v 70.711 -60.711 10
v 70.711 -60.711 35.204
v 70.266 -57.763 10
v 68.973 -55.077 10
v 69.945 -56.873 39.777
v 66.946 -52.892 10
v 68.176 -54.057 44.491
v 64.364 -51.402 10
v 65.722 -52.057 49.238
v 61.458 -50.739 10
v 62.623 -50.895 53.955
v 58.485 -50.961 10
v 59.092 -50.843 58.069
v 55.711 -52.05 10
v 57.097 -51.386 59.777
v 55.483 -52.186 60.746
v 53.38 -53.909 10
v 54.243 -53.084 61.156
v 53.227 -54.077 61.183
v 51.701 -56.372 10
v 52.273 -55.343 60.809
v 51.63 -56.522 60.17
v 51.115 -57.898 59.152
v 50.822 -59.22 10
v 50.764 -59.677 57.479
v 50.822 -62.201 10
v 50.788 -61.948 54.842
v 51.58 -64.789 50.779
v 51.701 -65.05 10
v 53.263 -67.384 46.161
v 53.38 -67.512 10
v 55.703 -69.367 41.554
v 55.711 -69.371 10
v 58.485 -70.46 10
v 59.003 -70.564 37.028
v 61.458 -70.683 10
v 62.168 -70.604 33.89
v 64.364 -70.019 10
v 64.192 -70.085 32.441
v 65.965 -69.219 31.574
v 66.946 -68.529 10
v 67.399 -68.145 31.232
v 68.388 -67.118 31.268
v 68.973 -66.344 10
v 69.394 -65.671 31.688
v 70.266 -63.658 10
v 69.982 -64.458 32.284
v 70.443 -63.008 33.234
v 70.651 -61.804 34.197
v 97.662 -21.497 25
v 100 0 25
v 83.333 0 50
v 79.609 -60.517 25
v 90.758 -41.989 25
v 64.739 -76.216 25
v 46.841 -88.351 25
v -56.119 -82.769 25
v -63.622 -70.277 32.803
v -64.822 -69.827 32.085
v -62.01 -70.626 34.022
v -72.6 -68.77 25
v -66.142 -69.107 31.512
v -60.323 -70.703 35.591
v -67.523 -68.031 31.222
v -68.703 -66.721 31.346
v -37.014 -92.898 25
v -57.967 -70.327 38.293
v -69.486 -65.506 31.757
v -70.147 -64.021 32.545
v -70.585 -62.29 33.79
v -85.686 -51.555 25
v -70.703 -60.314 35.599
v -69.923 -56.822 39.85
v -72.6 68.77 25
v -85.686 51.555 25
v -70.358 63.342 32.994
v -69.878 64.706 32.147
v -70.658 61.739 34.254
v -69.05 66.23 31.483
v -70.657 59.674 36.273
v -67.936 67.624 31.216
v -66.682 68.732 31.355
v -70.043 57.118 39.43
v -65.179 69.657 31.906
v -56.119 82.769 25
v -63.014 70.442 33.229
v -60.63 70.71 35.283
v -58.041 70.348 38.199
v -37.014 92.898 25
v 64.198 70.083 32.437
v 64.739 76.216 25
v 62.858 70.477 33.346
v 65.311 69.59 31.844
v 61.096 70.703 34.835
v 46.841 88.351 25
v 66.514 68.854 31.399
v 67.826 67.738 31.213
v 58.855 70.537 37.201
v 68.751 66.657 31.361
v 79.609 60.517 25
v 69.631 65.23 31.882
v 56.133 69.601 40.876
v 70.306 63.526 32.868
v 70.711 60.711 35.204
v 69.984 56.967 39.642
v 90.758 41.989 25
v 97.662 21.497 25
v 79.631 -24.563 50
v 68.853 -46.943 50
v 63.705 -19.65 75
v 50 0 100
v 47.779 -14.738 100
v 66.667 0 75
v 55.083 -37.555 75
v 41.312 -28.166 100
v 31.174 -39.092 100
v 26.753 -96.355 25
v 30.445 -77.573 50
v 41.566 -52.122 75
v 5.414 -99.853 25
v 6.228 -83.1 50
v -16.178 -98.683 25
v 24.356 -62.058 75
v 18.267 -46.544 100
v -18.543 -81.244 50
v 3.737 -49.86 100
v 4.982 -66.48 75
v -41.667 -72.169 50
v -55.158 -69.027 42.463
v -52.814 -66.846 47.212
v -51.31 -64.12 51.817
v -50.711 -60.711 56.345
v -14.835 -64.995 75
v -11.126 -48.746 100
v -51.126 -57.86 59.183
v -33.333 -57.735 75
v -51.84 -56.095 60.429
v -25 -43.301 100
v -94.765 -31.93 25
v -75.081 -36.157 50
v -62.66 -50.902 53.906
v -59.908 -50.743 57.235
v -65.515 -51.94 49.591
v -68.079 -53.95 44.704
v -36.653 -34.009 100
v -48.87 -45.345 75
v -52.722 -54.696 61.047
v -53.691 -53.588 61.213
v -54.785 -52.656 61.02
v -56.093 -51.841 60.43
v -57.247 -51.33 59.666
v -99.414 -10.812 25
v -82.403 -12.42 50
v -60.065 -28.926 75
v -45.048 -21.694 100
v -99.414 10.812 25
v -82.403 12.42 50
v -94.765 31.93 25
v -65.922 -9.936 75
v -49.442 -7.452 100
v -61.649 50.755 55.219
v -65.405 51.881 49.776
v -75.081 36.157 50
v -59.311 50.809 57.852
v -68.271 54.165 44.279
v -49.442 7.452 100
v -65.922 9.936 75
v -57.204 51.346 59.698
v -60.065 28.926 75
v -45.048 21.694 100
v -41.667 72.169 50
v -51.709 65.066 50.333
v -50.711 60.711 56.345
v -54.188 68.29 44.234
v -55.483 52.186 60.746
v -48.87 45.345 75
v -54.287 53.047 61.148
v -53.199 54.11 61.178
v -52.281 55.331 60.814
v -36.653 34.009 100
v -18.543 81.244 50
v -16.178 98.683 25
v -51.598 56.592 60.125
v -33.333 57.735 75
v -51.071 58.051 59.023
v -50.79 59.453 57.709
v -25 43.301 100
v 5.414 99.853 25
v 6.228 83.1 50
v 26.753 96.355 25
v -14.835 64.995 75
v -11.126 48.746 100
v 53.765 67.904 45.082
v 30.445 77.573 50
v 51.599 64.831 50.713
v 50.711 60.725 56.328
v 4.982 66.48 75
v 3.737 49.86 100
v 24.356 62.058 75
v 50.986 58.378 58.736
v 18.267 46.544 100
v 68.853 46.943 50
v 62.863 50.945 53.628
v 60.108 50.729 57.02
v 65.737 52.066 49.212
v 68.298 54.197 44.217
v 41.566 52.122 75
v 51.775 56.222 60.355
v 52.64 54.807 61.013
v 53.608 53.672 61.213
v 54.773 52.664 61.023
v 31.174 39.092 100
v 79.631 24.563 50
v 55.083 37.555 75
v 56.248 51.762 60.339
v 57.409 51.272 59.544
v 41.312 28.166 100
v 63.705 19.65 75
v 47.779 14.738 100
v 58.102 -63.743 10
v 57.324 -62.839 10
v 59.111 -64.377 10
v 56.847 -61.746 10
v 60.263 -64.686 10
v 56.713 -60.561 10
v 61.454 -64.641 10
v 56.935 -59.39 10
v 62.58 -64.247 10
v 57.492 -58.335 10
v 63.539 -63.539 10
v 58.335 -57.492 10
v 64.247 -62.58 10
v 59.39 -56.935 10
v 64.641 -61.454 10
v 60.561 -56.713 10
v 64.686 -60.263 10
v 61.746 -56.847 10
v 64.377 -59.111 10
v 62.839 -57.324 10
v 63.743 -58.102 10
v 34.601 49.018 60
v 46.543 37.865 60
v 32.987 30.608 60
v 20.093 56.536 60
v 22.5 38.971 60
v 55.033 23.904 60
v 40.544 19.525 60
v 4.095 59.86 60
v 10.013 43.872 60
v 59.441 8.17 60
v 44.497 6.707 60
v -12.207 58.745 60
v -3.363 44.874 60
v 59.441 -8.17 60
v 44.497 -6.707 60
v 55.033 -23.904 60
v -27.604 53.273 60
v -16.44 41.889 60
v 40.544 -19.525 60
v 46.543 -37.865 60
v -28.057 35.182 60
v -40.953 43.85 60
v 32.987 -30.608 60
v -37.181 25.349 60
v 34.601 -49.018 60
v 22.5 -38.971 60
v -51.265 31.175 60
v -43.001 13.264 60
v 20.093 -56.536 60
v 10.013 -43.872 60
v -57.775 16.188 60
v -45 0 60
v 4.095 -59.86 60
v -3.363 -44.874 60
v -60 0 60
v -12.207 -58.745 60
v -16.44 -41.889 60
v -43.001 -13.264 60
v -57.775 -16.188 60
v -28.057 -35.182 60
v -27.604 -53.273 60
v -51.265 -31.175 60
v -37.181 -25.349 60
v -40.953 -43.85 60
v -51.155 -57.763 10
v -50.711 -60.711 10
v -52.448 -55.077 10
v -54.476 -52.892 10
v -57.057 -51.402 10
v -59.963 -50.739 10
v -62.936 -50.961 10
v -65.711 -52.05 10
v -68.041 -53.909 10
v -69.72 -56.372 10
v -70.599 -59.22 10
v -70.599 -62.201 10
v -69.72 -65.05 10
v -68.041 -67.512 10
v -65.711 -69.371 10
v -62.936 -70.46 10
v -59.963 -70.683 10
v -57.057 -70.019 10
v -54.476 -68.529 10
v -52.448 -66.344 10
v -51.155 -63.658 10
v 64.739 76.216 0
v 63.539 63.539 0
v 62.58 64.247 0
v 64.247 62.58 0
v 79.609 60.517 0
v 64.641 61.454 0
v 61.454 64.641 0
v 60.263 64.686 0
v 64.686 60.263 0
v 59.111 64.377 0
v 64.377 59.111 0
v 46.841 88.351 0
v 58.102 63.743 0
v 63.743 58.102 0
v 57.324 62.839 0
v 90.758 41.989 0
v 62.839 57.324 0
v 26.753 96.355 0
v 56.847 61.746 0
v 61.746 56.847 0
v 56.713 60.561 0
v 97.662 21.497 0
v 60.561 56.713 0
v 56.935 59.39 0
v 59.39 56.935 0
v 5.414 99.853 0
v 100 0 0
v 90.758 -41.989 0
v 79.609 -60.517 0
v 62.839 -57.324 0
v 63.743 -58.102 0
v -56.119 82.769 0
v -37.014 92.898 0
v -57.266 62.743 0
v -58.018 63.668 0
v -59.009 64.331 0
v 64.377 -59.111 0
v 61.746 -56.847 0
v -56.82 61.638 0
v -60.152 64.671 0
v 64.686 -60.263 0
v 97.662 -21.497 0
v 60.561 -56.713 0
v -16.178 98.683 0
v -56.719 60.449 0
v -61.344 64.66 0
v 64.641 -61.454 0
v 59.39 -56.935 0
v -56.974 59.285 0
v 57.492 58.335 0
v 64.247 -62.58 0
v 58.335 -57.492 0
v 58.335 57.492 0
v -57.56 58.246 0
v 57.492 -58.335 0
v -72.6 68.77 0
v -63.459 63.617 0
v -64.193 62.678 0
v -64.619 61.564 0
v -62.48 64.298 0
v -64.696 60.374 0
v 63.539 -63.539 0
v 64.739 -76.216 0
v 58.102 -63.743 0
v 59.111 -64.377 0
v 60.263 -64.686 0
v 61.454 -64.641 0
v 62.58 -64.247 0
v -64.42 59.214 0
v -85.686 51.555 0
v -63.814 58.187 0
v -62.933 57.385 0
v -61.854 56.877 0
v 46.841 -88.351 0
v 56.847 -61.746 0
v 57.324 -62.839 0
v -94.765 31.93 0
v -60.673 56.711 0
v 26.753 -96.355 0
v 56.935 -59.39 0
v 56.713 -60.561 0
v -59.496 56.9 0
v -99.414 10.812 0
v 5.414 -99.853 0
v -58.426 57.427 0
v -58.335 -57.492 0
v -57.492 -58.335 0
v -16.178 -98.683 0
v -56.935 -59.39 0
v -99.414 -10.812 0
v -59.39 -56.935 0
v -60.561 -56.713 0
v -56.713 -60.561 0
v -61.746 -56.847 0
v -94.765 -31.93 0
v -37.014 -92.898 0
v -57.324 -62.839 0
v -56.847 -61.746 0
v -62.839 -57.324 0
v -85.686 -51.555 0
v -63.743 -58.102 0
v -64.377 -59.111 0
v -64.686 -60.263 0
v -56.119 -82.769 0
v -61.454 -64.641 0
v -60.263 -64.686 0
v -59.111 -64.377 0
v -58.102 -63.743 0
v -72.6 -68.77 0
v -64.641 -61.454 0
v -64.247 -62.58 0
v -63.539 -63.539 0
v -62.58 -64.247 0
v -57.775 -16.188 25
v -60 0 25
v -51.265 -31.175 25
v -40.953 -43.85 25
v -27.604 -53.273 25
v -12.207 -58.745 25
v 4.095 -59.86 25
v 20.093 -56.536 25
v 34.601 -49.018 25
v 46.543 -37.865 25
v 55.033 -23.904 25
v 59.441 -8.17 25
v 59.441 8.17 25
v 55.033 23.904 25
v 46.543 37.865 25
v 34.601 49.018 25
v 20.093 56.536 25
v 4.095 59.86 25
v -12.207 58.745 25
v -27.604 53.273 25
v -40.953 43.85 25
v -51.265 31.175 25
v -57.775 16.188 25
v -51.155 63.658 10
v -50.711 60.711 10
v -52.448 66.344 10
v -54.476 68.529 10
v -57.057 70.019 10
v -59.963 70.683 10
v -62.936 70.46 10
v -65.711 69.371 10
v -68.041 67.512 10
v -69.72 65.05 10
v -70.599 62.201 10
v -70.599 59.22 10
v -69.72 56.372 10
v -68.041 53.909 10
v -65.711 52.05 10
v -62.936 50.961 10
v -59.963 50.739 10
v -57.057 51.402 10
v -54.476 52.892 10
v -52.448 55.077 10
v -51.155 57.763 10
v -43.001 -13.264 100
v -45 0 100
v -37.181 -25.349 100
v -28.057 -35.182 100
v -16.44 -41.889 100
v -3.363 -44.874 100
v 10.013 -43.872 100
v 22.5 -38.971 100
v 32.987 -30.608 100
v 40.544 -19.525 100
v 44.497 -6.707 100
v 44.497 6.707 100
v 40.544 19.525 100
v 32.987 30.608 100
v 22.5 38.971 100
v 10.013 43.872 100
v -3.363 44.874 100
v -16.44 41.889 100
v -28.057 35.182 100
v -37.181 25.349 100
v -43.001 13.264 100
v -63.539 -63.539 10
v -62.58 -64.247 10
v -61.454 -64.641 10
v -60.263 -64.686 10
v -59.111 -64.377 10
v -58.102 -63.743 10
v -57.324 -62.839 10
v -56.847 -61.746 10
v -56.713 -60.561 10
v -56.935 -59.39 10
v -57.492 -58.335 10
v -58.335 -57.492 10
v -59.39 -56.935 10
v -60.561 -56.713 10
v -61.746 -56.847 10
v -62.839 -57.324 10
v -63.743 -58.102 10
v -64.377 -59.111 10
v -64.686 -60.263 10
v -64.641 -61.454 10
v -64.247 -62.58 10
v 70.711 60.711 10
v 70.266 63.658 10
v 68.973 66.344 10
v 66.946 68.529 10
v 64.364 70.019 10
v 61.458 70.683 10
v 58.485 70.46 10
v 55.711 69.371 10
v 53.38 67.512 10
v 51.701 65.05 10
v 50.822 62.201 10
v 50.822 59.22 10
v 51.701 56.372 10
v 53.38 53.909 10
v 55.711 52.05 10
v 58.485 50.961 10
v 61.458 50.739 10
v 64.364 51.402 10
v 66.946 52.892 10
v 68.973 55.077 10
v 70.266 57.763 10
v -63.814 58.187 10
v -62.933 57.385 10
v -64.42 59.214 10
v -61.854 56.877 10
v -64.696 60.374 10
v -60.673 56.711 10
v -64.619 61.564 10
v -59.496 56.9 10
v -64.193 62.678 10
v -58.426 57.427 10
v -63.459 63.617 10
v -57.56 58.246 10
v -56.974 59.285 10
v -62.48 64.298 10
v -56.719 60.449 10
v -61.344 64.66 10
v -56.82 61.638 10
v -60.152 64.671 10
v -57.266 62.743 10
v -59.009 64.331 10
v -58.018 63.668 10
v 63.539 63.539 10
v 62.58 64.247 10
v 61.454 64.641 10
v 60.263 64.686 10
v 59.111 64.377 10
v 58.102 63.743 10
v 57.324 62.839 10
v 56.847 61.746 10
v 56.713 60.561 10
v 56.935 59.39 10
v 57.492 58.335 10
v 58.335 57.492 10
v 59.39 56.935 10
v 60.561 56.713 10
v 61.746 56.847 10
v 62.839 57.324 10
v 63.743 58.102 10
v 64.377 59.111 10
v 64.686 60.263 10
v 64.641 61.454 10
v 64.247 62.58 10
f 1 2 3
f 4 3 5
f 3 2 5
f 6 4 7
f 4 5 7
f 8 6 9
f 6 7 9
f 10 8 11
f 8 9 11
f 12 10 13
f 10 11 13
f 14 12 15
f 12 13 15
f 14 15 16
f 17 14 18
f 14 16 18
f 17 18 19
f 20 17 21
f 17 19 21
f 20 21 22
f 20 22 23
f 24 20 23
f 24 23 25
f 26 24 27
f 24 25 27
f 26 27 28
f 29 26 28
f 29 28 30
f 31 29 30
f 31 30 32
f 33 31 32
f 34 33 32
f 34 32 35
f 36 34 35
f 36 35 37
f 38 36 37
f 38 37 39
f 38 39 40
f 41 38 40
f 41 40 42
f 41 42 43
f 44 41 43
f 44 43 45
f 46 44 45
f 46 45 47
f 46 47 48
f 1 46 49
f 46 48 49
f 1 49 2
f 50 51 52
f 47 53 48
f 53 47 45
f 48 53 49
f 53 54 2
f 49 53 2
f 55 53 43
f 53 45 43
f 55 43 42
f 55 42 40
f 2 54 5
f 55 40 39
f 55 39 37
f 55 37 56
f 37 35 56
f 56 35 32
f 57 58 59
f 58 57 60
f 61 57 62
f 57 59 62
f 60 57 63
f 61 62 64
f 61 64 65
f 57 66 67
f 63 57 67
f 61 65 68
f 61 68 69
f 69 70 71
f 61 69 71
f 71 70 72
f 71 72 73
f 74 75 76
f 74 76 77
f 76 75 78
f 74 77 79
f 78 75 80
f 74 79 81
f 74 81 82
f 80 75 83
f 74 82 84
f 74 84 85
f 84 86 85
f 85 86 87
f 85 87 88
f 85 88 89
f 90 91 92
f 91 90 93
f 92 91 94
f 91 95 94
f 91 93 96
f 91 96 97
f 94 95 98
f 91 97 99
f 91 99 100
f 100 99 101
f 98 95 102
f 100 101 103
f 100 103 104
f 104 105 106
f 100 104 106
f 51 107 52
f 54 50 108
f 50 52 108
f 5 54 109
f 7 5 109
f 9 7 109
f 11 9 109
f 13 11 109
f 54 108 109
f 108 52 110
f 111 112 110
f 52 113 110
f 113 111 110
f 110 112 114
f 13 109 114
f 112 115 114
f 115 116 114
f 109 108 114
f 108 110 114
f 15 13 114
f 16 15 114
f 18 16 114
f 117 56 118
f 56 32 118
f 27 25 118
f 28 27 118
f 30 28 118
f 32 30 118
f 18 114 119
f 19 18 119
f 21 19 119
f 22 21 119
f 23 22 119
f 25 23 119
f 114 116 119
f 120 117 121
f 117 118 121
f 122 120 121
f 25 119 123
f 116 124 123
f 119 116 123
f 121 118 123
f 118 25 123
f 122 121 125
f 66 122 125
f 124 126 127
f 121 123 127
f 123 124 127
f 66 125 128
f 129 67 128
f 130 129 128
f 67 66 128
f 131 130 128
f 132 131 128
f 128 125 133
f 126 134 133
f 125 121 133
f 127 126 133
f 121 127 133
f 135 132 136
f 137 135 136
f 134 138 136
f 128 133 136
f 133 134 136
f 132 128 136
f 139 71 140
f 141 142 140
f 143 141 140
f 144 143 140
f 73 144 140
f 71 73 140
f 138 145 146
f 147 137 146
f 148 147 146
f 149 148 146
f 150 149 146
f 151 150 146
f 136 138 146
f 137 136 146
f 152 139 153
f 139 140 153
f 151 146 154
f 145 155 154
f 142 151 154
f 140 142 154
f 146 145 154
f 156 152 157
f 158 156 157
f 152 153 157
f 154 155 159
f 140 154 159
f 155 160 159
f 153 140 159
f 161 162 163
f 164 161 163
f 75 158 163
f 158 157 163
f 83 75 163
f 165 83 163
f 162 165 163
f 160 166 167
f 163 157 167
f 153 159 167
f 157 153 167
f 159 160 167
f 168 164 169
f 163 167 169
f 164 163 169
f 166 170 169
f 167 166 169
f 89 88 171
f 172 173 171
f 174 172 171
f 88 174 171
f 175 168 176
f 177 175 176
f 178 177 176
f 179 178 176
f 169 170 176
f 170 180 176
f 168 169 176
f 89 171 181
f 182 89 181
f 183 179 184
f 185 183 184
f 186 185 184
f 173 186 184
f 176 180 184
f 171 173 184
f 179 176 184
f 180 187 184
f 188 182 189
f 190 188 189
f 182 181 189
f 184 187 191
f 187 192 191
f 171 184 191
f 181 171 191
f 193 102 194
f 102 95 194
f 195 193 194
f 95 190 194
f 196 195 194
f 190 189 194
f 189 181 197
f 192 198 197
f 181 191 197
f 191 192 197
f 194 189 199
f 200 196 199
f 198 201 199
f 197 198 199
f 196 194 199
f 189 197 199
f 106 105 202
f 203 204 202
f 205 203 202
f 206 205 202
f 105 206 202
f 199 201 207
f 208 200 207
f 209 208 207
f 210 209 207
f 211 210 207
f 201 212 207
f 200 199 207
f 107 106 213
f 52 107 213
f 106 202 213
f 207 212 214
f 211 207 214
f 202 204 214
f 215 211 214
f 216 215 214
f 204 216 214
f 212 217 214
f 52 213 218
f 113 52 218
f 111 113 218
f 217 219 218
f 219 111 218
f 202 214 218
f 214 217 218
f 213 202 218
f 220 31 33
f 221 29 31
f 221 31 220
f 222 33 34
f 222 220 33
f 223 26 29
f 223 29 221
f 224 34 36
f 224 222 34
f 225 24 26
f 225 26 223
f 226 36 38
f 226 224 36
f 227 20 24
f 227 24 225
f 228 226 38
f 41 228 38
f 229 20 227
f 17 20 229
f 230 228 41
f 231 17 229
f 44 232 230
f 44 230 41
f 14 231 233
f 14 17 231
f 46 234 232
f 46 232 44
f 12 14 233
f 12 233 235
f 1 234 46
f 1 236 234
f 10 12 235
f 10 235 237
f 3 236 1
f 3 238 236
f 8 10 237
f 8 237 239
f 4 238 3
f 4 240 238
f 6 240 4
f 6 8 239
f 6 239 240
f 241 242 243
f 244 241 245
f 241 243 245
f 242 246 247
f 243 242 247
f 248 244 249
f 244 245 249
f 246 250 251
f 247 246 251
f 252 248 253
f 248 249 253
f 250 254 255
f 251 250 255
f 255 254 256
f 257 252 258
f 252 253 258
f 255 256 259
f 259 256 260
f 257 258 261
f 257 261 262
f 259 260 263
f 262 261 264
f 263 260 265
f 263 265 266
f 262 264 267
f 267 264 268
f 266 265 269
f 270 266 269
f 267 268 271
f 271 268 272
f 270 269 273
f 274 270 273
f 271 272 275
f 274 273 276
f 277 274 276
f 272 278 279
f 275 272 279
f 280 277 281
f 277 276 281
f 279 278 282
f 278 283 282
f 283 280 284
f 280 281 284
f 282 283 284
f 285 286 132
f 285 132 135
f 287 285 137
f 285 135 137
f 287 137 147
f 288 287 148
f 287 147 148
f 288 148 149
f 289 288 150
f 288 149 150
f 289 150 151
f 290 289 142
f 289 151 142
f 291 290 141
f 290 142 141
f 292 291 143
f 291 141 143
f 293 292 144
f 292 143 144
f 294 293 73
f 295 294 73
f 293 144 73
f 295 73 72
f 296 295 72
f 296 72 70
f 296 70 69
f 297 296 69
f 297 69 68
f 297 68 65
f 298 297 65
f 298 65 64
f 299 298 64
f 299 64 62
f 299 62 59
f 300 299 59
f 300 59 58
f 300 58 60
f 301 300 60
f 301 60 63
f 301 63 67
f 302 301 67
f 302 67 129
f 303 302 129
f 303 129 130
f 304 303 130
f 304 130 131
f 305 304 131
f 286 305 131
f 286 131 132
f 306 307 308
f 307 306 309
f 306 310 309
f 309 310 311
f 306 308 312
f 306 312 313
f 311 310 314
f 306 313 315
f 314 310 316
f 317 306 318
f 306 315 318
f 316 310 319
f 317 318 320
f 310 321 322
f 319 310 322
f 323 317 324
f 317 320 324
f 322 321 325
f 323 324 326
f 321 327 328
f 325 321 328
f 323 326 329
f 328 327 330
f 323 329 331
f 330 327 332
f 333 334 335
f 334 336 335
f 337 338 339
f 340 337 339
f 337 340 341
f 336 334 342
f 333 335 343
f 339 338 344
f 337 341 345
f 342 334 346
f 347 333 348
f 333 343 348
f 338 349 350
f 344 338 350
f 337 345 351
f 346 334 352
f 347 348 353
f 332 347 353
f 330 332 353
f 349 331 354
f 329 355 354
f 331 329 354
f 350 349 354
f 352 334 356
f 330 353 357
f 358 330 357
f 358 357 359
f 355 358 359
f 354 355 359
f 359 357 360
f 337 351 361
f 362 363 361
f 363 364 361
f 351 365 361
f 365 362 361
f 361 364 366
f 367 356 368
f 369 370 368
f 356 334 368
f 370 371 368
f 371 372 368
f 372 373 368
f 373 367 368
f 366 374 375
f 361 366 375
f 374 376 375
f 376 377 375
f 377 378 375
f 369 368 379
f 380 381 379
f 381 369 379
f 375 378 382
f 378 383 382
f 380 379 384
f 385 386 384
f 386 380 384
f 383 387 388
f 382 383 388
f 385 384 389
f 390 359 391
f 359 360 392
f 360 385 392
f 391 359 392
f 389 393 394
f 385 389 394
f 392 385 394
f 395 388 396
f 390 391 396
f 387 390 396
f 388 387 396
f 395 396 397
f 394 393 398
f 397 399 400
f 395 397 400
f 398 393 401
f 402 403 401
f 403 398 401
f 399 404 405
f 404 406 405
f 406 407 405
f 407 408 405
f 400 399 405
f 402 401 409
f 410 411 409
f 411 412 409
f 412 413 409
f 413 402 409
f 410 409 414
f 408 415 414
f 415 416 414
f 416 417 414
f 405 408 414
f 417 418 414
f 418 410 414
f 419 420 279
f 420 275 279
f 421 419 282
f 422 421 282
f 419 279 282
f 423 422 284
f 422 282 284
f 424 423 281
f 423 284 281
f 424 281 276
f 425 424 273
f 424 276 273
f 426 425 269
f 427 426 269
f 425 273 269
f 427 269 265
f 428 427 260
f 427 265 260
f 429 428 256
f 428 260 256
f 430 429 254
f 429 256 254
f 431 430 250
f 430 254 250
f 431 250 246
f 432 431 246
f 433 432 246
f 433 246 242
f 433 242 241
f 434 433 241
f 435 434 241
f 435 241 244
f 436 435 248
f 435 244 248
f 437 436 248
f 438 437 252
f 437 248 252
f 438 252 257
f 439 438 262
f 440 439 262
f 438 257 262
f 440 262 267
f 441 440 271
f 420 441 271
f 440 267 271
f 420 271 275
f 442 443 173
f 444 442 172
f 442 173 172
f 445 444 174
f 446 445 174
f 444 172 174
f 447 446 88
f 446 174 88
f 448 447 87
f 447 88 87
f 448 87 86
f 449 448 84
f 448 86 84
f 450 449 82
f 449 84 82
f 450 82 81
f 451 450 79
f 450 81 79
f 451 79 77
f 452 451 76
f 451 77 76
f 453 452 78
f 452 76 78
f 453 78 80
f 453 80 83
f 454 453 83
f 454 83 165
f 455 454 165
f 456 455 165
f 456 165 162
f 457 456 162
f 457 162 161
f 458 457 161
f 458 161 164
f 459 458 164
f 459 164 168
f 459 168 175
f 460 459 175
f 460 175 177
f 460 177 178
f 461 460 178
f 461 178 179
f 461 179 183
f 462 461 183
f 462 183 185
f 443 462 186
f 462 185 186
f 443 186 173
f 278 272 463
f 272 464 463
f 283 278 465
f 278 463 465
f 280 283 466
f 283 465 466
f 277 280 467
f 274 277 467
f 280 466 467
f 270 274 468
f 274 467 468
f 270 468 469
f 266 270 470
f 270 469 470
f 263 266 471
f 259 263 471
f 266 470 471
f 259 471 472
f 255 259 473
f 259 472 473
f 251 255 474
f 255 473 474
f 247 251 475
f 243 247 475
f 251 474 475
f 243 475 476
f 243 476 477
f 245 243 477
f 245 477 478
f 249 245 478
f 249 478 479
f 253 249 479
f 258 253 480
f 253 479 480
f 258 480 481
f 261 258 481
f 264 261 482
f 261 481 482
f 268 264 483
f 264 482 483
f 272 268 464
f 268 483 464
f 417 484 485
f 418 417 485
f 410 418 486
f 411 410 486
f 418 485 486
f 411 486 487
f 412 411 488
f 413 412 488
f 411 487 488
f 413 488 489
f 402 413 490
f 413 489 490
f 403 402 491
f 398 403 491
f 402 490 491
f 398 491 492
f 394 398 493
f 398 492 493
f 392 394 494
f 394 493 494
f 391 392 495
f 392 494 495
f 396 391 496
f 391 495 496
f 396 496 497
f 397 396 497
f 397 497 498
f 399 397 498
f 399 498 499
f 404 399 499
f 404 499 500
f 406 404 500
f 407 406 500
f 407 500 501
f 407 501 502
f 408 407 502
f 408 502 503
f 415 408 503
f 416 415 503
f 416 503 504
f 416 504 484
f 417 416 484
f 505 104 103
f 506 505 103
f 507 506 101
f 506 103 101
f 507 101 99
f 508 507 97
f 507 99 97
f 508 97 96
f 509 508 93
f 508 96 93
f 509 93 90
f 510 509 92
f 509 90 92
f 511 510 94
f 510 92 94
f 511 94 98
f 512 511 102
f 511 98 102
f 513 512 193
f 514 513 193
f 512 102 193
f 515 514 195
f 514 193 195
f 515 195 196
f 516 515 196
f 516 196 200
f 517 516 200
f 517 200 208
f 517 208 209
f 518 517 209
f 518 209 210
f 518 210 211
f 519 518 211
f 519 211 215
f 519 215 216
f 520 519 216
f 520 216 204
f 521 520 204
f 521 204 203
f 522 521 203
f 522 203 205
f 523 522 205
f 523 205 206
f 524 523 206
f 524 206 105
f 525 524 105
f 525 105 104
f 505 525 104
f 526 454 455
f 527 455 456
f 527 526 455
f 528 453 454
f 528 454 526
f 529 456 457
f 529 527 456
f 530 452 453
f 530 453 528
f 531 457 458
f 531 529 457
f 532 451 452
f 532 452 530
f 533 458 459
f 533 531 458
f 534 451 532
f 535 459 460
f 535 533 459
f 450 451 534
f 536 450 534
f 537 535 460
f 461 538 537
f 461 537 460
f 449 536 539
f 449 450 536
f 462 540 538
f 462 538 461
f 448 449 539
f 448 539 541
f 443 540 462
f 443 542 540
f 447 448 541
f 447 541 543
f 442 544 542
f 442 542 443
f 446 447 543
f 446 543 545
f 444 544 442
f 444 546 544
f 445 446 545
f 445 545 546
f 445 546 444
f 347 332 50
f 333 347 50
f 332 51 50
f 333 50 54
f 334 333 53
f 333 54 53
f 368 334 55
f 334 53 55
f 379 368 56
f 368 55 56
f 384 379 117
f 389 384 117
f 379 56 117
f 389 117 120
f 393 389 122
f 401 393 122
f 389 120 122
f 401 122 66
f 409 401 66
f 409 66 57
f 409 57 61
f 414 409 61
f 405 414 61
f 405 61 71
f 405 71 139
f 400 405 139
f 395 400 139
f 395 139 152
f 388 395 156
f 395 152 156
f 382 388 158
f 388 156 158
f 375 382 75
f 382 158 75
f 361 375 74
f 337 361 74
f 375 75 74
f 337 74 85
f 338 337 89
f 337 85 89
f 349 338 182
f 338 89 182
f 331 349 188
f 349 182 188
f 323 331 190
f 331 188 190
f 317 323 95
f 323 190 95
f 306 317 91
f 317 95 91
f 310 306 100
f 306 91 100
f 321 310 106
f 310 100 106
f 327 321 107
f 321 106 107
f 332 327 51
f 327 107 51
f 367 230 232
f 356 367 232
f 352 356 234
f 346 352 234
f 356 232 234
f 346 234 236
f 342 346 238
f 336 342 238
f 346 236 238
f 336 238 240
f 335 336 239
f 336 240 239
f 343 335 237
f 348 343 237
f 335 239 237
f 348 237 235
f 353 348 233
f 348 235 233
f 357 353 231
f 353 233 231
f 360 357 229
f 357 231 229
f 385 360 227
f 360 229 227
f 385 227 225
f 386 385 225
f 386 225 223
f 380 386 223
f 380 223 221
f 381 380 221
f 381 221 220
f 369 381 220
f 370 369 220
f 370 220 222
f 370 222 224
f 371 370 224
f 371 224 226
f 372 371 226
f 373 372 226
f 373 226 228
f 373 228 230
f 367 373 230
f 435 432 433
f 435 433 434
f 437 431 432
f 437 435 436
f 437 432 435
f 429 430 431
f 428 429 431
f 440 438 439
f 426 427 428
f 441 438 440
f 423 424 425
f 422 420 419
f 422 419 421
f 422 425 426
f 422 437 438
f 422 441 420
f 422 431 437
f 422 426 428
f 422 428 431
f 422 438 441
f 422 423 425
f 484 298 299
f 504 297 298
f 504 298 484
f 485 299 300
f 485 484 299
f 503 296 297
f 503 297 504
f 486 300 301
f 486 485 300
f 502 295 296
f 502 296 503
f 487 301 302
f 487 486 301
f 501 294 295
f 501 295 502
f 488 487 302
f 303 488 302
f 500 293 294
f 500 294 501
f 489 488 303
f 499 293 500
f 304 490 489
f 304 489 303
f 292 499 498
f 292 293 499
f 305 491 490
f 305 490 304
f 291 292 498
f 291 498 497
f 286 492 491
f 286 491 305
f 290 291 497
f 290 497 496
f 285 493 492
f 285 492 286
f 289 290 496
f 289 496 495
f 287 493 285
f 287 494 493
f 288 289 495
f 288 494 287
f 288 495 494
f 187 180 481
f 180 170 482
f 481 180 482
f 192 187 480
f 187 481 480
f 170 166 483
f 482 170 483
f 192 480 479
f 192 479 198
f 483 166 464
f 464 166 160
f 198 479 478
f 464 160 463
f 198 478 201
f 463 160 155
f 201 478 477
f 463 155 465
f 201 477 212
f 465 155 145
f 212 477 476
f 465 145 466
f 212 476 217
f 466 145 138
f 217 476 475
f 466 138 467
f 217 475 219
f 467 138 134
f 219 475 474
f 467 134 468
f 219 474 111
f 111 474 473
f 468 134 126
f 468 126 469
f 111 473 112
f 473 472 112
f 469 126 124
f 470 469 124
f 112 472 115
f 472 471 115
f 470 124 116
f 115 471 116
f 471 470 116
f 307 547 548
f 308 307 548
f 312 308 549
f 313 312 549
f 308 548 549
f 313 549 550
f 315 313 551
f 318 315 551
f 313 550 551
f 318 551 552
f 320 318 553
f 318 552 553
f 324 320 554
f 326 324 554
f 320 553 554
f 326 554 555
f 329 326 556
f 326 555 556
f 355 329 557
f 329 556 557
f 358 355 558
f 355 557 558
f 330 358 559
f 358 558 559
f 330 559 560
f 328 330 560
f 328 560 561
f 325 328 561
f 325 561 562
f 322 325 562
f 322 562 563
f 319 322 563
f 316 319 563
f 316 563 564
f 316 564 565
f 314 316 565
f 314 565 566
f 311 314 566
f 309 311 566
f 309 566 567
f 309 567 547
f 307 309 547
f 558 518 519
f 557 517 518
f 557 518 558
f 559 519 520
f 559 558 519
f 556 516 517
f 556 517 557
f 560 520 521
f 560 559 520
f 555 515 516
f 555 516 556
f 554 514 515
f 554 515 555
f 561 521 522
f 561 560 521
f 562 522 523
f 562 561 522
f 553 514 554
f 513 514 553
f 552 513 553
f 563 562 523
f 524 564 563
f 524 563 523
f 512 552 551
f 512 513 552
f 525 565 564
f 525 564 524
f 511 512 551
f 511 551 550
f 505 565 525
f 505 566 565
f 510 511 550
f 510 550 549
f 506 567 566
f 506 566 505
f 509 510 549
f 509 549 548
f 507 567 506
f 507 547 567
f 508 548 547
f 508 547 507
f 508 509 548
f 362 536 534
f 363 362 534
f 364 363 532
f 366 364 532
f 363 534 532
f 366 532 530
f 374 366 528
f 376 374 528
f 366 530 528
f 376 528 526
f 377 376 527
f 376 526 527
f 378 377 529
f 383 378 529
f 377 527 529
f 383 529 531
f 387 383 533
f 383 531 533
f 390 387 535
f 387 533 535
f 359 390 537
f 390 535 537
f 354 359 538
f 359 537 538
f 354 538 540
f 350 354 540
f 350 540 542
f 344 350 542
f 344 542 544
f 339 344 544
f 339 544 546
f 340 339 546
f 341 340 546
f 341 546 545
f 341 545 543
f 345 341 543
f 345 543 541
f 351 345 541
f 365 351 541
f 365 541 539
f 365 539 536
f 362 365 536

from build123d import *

# Parameters (mm, degrees)
SKETCH8_R          = 4
CUT_EXTRUDE1_DEPTH = 121
SKETCH8_9_R        = 10
CUT_EXTRUDE2_DEPTH = 90


with BuildPart() as part:
    # Sketch6 → Revolve1 (revolve)
    with BuildSketch(Plane.YZ):
        Polygon((0, 0), (-100, 0), (-100, 25), (-50, 100), (0, 100), align=None)
    revolve(axis=Axis((0, 0, 100), (0, 0, -1)))

    # Sketch7 → Cut-Revolve1 (revolve, cut)
    with BuildSketch(Plane(origin=(0, 0, 0), x_dir=(-1, 0, 0), z_dir=(0, 1, 0))):
        Polygon((0, 25), (-45, 25), (-60, 25), (-60, 60), (-45, 60), (-45, 100), (0, 100), align=None)
    revolve(axis=Axis((0, 0, 25), (0, 0, 1)), mode=Mode.SUBTRACT)

    # Sketch8 → Cut-Extrude1 (cut)
    with BuildSketch(Plane.XY.offset(100)):
        with Locations((-60.710678119, 60.710678119)):
            Circle(SKETCH8_R)
        with Locations((60.710678119, 60.710678119)):
            Circle(SKETCH8_R)
        with Locations((60.710678119, -60.710678119)):
            Circle(SKETCH8_R)
        with Locations((-60.710678119, -60.710678119)):
            Circle(SKETCH8_R)
    extrude(amount=-CUT_EXTRUDE1_DEPTH, mode=Mode.SUBTRACT)

    # Sketch8<9> → Cut-Extrude2 (cut)
    with BuildSketch(Plane.XY.offset(100)):
        with Locations((-60.710678119, 60.710678119)):
            Circle(SKETCH8_9_R)
        with Locations((60.710678119, 60.710678119)):
            Circle(SKETCH8_9_R)
        with Locations((60.710678119, -60.710678119)):
            Circle(SKETCH8_9_R)
        with Locations((-60.710678119, -60.710678119)):
            Circle(SKETCH8_9_R)
    extrude(amount=-CUT_EXTRUDE2_DEPTH, mode=Mode.SUBTRACT)


solid = part.part
